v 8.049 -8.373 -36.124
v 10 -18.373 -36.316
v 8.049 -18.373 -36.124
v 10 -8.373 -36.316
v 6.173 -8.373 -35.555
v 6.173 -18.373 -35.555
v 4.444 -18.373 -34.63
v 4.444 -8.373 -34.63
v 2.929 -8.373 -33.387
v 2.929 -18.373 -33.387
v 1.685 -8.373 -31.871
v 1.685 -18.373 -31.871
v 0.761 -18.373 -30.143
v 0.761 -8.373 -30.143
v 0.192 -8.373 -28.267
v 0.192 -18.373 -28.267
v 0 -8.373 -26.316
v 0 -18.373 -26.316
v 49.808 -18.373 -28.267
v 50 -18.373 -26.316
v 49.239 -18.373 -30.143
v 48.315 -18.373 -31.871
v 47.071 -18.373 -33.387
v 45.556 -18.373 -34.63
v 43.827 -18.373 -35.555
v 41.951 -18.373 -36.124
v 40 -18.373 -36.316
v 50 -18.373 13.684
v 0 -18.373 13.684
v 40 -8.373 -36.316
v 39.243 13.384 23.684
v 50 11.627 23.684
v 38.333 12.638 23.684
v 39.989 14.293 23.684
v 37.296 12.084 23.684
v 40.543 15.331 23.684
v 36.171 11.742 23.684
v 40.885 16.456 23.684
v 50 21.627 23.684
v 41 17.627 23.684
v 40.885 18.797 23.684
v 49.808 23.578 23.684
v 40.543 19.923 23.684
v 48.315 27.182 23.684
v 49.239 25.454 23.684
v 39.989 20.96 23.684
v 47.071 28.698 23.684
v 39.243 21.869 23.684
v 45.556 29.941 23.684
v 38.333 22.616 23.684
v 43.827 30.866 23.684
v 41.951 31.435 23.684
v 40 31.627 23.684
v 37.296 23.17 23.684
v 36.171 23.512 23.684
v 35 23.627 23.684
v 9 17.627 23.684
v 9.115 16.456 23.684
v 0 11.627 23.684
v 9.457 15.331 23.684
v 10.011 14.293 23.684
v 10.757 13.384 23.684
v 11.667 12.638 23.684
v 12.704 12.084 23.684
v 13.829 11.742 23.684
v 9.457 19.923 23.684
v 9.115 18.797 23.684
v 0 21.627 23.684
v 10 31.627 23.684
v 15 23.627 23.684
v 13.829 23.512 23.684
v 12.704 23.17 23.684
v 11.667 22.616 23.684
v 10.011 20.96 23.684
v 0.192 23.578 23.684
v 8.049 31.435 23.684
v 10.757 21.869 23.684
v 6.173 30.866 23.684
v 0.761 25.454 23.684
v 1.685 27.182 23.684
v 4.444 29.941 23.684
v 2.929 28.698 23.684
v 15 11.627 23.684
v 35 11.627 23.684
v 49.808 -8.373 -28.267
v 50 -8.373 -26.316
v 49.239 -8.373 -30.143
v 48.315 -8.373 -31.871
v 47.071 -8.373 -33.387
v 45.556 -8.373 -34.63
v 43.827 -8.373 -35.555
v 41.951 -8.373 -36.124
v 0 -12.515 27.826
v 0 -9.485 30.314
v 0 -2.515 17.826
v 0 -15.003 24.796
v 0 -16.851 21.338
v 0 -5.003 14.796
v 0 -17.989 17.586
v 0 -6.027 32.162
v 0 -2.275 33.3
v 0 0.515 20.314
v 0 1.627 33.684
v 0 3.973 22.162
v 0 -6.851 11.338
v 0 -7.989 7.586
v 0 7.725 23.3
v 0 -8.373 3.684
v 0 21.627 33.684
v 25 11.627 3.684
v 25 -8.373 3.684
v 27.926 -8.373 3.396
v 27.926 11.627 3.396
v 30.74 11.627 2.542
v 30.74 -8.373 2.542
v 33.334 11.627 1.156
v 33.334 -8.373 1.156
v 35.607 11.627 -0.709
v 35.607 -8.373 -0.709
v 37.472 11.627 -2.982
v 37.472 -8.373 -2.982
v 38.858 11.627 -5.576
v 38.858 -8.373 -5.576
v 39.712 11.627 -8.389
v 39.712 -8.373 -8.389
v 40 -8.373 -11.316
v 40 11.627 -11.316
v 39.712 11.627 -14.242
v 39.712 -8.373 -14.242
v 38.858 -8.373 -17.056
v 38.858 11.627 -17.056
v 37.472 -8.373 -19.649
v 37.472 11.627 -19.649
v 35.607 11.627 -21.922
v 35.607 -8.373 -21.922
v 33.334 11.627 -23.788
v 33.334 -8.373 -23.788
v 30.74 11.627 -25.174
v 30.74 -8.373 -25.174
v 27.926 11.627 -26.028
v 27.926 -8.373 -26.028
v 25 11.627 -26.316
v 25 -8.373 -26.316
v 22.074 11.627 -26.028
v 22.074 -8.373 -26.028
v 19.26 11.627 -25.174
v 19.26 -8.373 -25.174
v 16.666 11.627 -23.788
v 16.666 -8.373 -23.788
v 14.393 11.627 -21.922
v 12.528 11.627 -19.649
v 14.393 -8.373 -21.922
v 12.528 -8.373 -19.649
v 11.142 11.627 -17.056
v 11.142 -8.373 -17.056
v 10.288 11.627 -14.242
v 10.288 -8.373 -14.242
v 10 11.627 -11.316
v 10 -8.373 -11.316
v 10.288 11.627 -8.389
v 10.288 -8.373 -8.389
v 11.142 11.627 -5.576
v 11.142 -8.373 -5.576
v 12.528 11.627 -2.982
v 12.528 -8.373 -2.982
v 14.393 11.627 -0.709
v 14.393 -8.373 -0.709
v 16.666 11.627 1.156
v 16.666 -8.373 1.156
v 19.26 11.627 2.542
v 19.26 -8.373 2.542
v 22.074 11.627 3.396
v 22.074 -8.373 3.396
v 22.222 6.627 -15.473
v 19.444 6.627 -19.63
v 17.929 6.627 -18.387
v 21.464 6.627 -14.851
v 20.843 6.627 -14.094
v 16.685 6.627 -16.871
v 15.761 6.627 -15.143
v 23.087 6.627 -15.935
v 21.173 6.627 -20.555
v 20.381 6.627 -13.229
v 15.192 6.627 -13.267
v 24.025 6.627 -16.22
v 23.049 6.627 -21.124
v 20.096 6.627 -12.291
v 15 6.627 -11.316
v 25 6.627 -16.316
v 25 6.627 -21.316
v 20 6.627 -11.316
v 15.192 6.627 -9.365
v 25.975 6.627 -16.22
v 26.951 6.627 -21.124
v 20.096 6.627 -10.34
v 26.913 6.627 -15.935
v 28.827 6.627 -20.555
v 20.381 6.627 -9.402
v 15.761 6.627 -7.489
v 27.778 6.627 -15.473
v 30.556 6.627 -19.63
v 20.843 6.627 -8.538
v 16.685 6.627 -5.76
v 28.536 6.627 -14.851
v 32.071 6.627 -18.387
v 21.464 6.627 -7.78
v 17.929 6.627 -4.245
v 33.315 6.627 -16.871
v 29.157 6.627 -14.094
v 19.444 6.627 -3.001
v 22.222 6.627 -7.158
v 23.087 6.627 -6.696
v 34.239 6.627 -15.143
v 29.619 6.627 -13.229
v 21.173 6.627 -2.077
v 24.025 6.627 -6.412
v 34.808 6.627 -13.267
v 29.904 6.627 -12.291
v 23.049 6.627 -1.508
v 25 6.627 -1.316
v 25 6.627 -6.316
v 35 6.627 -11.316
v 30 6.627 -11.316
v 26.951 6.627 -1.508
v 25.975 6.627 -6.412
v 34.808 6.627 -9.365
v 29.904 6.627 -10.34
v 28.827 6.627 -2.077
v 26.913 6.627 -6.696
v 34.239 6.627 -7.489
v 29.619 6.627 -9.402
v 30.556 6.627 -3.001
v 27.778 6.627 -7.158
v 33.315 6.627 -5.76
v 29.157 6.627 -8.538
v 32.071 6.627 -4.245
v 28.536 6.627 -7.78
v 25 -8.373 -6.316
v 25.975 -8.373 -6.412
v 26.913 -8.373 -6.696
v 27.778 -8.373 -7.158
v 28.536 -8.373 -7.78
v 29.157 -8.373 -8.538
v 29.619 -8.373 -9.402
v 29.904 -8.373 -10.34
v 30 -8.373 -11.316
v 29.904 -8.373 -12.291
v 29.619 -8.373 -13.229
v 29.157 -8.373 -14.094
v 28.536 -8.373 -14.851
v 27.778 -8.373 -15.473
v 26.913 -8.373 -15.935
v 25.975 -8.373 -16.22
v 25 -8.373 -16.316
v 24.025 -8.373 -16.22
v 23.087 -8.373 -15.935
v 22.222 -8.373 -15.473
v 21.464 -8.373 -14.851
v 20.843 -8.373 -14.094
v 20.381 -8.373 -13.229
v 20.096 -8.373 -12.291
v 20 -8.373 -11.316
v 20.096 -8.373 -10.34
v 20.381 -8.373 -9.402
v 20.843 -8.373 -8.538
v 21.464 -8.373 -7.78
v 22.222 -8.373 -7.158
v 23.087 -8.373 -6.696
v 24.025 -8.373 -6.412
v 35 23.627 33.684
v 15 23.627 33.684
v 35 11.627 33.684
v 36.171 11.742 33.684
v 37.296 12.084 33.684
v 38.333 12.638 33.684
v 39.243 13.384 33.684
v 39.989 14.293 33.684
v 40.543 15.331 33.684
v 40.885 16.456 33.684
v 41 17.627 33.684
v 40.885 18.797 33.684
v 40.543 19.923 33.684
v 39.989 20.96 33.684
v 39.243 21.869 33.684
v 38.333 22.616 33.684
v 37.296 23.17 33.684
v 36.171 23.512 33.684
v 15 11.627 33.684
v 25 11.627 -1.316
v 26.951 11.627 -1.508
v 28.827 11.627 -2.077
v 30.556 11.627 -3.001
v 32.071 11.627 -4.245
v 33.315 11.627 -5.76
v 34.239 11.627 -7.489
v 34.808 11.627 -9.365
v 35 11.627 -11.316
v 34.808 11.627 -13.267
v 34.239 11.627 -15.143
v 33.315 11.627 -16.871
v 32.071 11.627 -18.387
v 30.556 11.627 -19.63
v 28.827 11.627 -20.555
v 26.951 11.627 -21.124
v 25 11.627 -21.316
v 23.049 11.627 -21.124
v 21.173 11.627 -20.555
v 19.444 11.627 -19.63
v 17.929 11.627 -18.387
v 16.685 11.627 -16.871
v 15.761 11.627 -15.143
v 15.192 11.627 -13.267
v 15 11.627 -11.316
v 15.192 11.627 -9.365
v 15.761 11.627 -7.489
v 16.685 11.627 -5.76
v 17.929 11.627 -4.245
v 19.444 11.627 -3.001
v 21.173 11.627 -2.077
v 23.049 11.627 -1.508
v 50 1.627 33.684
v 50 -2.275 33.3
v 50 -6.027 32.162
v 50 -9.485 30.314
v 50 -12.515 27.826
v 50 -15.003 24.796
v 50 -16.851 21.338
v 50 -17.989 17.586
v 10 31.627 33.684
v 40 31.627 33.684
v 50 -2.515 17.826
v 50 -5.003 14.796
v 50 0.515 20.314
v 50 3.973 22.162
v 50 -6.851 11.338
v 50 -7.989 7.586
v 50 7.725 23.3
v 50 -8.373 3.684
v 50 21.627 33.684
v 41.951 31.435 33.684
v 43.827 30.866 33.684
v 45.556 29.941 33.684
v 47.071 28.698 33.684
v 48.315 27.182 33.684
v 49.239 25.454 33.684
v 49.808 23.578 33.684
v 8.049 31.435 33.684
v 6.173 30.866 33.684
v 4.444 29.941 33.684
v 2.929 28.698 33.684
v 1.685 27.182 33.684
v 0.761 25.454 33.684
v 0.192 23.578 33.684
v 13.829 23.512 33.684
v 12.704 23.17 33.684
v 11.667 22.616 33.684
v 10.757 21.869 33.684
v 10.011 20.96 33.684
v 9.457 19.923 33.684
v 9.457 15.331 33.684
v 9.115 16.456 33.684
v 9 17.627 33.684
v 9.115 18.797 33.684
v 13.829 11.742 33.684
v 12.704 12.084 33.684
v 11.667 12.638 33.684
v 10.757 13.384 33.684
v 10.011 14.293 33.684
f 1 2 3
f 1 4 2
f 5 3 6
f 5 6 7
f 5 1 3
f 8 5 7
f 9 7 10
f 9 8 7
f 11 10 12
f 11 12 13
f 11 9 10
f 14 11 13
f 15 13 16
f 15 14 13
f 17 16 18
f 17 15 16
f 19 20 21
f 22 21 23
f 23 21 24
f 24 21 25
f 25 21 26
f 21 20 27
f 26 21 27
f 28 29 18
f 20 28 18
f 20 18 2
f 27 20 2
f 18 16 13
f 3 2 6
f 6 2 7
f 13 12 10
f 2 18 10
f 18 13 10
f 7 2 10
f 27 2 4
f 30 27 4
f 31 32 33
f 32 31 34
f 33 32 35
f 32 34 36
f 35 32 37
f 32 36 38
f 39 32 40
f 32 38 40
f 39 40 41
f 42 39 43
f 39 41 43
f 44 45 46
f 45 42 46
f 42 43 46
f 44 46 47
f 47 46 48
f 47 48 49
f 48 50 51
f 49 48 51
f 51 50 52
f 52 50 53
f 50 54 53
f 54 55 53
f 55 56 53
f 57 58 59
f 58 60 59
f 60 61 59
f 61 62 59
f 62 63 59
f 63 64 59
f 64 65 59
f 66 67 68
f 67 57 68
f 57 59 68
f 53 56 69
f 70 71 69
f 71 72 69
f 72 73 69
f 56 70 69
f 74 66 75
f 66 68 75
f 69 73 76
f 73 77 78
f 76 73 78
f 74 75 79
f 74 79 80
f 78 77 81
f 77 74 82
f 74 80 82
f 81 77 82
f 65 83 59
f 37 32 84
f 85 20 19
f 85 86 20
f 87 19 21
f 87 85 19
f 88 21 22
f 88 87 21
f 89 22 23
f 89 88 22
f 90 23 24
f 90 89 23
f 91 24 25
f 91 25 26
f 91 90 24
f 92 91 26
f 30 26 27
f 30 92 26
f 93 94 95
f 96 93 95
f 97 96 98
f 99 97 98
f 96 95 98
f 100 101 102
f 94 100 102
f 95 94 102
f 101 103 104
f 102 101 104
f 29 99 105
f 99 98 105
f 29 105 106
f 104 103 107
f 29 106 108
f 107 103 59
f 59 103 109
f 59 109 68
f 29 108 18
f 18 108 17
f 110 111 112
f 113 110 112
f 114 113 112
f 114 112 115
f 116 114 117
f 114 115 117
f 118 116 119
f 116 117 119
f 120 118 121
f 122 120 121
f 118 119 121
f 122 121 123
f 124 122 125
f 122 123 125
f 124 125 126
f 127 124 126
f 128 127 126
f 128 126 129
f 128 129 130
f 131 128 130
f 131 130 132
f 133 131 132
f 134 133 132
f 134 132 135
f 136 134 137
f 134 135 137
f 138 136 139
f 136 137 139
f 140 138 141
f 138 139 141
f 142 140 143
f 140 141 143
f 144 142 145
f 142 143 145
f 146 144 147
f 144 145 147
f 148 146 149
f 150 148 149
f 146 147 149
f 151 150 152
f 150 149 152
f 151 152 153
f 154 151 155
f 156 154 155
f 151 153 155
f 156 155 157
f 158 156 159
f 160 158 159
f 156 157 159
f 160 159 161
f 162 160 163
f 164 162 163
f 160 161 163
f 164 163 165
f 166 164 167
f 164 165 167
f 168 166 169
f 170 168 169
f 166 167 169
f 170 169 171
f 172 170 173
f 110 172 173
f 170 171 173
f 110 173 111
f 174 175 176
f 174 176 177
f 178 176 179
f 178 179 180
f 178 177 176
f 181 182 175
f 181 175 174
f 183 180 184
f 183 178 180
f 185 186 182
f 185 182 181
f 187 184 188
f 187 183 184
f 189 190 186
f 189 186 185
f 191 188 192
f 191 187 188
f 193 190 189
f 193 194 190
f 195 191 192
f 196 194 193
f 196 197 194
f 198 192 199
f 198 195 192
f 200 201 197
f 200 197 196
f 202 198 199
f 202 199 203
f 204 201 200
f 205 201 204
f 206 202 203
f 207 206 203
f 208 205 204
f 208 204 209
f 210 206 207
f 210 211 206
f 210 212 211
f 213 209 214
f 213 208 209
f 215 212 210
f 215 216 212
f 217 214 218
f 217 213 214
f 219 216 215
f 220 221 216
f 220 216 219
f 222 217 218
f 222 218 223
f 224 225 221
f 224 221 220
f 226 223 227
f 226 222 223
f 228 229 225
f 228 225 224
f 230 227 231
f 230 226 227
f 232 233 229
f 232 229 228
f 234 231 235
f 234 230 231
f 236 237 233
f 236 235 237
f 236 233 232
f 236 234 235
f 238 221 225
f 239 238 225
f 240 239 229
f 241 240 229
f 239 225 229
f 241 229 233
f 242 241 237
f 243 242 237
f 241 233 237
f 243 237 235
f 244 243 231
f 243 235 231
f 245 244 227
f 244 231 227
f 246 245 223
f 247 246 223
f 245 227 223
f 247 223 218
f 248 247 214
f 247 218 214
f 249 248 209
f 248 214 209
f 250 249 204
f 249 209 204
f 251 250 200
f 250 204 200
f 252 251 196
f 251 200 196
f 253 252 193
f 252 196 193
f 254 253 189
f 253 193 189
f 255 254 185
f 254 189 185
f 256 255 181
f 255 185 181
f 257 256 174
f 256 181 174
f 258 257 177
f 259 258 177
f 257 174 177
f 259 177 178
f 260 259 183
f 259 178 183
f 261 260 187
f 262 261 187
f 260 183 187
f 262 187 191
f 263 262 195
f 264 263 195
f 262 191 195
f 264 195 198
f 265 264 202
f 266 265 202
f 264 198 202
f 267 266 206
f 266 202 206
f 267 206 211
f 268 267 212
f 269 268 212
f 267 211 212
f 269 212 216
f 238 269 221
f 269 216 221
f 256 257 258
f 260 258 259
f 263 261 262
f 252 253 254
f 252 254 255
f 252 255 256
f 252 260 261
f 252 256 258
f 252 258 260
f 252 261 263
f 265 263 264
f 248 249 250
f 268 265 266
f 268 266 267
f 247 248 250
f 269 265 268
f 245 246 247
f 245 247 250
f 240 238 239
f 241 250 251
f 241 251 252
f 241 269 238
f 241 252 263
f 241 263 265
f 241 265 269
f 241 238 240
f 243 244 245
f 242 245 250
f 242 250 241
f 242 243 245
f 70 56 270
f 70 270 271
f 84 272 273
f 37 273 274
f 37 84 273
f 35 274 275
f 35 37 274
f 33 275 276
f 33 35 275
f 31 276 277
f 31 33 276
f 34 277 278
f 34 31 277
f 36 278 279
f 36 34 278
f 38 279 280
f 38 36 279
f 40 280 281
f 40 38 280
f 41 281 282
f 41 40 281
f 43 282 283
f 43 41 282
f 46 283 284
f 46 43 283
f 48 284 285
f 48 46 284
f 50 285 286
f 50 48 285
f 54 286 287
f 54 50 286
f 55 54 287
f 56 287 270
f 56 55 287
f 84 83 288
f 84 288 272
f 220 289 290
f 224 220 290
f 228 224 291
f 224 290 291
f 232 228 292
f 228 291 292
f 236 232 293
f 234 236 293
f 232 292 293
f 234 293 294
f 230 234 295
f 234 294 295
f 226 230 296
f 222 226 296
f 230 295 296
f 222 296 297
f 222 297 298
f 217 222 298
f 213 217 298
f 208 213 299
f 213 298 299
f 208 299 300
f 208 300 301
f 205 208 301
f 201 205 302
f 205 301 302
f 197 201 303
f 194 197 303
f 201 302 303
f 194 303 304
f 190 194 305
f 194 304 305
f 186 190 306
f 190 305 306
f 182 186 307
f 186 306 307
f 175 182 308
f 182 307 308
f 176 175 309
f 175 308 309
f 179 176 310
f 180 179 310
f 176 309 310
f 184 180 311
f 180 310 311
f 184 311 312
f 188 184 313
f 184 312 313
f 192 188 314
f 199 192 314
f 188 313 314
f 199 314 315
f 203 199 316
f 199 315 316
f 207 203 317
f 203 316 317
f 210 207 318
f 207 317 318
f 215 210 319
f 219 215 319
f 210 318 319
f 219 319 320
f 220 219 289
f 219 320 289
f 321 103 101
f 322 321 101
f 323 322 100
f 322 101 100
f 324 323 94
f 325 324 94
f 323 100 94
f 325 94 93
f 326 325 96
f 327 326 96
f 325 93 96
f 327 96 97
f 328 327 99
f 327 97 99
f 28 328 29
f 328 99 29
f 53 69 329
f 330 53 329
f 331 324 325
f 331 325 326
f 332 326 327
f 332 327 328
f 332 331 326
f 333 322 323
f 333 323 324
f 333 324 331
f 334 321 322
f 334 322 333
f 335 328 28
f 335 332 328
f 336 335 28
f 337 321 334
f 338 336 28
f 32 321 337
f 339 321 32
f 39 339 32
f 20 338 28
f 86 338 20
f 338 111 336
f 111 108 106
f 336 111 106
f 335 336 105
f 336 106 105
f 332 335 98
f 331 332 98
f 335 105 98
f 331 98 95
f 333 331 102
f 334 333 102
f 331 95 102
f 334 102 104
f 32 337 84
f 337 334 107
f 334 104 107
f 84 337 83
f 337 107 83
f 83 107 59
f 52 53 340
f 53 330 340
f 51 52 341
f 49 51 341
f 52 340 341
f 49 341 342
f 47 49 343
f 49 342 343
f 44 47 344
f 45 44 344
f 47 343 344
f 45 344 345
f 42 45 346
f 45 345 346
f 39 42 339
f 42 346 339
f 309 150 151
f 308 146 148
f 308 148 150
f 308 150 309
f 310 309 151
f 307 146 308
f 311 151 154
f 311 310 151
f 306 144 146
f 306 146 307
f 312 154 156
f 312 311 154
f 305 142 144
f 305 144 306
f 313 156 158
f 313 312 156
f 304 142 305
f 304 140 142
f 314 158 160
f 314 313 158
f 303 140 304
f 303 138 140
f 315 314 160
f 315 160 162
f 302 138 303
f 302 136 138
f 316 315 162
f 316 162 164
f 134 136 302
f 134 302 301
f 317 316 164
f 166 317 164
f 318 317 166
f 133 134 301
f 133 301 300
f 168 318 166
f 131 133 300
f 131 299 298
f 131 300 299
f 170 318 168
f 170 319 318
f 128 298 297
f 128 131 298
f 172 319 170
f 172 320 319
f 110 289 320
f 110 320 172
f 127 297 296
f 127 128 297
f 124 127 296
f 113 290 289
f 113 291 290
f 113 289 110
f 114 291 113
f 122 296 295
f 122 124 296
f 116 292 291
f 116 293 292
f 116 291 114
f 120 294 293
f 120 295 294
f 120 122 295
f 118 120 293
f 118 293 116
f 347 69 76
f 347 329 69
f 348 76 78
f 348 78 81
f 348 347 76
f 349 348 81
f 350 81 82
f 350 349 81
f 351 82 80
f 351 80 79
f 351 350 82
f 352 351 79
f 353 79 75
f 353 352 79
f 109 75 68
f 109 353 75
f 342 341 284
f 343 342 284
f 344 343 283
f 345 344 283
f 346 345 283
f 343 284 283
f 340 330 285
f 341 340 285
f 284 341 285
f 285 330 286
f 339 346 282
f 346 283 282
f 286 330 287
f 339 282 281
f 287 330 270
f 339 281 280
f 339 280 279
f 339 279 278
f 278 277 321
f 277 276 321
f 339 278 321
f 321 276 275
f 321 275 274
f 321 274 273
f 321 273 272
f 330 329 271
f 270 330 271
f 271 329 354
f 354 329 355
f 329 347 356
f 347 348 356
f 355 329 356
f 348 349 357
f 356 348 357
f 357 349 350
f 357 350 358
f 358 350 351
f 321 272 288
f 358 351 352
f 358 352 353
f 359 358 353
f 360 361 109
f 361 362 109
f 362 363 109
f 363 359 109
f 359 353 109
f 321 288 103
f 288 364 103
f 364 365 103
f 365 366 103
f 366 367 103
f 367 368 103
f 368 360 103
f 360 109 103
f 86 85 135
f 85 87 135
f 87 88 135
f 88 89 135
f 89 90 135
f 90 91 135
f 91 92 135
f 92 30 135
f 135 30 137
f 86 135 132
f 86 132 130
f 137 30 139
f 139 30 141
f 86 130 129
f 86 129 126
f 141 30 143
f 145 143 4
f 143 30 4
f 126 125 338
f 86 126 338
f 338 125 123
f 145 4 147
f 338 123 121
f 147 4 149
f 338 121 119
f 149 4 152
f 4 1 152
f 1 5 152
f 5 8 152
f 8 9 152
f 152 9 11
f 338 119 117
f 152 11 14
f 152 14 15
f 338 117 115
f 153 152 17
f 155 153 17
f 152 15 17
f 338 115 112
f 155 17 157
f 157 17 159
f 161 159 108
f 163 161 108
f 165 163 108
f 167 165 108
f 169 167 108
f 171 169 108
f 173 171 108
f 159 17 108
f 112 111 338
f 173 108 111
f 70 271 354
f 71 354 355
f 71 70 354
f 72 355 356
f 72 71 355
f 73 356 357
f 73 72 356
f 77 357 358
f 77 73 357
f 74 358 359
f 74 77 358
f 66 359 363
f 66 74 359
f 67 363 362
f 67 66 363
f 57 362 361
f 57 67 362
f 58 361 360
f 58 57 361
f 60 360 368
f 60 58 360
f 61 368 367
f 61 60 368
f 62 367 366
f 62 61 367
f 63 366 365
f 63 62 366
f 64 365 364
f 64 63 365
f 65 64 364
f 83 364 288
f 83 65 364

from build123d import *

# Parameters (mm, degrees)
SALIENTE_EXTRUIR1_DEPTH = 50
CORTAR_EXTRUIR1_DEPTH   = 85.263005614
REDONDEO1_R             = 10
REDONDEO2_R             = 10
REDONDEO3_R             = 10
REDONDEO4_R             = 10
CROQUIS5_R              = 15
SALIENTE_EXTRUIR5_DEPTH = 20
CROQUIS7_R              = 10
CORTAR_EXTRUIR3_DEPTH   = 5
CROQUIS9_R              = 5
CORTAR_EXTRUIR4_DEPTH   = 15


with BuildPart() as part:
    # Croquis1 → Saliente-Extruir1 (new body)
    with BuildSketch(Plane(origin=(0, 0, 0), x_dir=(0, 0, -1), z_dir=(1, 0, 0))):
        with BuildLine():
            Line((-33.684210526, 31.626794258), (-33.684210526, 1.626794258))
            ThreePointArc((-33.684210526, 1.626794258), (-27.82634615, -12.515341365), (-13.684210526, -18.373205742))
            Line((-13.684210526, -18.373205742), (36.315789474, -18.373205742))
            Line((36.315789474, -18.373205742), (36.315789474, -8.373205742))
            Line((36.315789474, -8.373205742), (-3.684210526, -8.373205742))
            ThreePointArc((-3.684210526, -8.373205742), (-17.82634615, -2.515341365), (-23.684210526, 11.626794258))
            Line((-23.684210526, 11.626794258), (-23.684210526, 31.626794258))
            Line((-23.684210526, 31.626794258), (-33.684210526, 31.626794258))
        make_face()
    extrude(amount=SALIENTE_EXTRUIR1_DEPTH)

    # Croquis2 → Cortar-Extruir1 (cut, through all)
    with BuildSketch(Plane(origin=(0, 0, 23.684210526), x_dir=(-1, 0, 0), z_dir=(0, 0, -1))):
        with BuildLine():
            Line((-35, 23.626794258), (-15, 23.626794258))
            ThreePointArc((-15, 23.626794258), (-9, 17.626794258), (-15, 11.626794258))
            Line((-15, 11.626794258), (-35, 11.626794258))
            ThreePointArc((-35, 11.626794258), (-41, 17.626794258), (-35, 23.626794258))
        make_face()
    extrude(amount=-CORTAR_EXTRUIR1_DEPTH, mode=Mode.SUBTRACT)

    # Redondeo1
    redondeo1_edges = [part.edges().sort_by_distance(p)[0] for p in [
        (50, 31.626794258, 28.684210526),
    ]]
    fillet(redondeo1_edges, radius=REDONDEO1_R)

    # Redondeo2
    redondeo2_edges = [part.edges().sort_by_distance(p)[0] for p in [
        (0, 31.626794258, 28.684210526),
    ]]
    fillet(redondeo2_edges, radius=REDONDEO2_R)

    # Redondeo3
    redondeo3_edges = [part.edges().sort_by_distance(p)[0] for p in [
        (50, -13.373205742, -36.315789474),
    ]]
    fillet(redondeo3_edges, radius=REDONDEO3_R)

    # Redondeo4
    redondeo4_edges = [part.edges().sort_by_distance(p)[0] for p in [
        (0, -13.373205742, -36.315789474),
    ]]
    fillet(redondeo4_edges, radius=REDONDEO4_R)

    # Croquis5 → Saliente-Extruir5 (add)
    with BuildSketch(Plane(origin=(0, -8.373205742, 0), x_dir=(1, 0, 0), z_dir=(0, 1, 0))):
        with Locations(Location((25, 11.315789474, 0), (0, 0, 270))):
            Circle(CROQUIS5_R)
    extrude(amount=SALIENTE_EXTRUIR5_DEPTH)

    # Croquis7 → Cortar-Extruir3 (cut)
    with BuildSketch(Plane(origin=(0, 11.626794258, 0), x_dir=(1, 0, 0), z_dir=(0, 1, 0))):
        with Locations(Location((25, 11.315789474, 0), (0, 0, 270))):
            Circle(CROQUIS7_R)
    extrude(amount=-CORTAR_EXTRUIR3_DEPTH, mode=Mode.SUBTRACT)

    # Croquis9 → Cortar-Extruir4 (cut)
    with BuildSketch(Plane(origin=(0, 6.626794258, 0), x_dir=(1, 0, 0), z_dir=(0, 1, 0))):
        with Locations(Location((25, 11.315789474, 0), (0, 0, 270))):
            Circle(CROQUIS9_R)
    extrude(amount=-CORTAR_EXTRUIR4_DEPTH, mode=Mode.SUBTRACT)


solid = part.part
